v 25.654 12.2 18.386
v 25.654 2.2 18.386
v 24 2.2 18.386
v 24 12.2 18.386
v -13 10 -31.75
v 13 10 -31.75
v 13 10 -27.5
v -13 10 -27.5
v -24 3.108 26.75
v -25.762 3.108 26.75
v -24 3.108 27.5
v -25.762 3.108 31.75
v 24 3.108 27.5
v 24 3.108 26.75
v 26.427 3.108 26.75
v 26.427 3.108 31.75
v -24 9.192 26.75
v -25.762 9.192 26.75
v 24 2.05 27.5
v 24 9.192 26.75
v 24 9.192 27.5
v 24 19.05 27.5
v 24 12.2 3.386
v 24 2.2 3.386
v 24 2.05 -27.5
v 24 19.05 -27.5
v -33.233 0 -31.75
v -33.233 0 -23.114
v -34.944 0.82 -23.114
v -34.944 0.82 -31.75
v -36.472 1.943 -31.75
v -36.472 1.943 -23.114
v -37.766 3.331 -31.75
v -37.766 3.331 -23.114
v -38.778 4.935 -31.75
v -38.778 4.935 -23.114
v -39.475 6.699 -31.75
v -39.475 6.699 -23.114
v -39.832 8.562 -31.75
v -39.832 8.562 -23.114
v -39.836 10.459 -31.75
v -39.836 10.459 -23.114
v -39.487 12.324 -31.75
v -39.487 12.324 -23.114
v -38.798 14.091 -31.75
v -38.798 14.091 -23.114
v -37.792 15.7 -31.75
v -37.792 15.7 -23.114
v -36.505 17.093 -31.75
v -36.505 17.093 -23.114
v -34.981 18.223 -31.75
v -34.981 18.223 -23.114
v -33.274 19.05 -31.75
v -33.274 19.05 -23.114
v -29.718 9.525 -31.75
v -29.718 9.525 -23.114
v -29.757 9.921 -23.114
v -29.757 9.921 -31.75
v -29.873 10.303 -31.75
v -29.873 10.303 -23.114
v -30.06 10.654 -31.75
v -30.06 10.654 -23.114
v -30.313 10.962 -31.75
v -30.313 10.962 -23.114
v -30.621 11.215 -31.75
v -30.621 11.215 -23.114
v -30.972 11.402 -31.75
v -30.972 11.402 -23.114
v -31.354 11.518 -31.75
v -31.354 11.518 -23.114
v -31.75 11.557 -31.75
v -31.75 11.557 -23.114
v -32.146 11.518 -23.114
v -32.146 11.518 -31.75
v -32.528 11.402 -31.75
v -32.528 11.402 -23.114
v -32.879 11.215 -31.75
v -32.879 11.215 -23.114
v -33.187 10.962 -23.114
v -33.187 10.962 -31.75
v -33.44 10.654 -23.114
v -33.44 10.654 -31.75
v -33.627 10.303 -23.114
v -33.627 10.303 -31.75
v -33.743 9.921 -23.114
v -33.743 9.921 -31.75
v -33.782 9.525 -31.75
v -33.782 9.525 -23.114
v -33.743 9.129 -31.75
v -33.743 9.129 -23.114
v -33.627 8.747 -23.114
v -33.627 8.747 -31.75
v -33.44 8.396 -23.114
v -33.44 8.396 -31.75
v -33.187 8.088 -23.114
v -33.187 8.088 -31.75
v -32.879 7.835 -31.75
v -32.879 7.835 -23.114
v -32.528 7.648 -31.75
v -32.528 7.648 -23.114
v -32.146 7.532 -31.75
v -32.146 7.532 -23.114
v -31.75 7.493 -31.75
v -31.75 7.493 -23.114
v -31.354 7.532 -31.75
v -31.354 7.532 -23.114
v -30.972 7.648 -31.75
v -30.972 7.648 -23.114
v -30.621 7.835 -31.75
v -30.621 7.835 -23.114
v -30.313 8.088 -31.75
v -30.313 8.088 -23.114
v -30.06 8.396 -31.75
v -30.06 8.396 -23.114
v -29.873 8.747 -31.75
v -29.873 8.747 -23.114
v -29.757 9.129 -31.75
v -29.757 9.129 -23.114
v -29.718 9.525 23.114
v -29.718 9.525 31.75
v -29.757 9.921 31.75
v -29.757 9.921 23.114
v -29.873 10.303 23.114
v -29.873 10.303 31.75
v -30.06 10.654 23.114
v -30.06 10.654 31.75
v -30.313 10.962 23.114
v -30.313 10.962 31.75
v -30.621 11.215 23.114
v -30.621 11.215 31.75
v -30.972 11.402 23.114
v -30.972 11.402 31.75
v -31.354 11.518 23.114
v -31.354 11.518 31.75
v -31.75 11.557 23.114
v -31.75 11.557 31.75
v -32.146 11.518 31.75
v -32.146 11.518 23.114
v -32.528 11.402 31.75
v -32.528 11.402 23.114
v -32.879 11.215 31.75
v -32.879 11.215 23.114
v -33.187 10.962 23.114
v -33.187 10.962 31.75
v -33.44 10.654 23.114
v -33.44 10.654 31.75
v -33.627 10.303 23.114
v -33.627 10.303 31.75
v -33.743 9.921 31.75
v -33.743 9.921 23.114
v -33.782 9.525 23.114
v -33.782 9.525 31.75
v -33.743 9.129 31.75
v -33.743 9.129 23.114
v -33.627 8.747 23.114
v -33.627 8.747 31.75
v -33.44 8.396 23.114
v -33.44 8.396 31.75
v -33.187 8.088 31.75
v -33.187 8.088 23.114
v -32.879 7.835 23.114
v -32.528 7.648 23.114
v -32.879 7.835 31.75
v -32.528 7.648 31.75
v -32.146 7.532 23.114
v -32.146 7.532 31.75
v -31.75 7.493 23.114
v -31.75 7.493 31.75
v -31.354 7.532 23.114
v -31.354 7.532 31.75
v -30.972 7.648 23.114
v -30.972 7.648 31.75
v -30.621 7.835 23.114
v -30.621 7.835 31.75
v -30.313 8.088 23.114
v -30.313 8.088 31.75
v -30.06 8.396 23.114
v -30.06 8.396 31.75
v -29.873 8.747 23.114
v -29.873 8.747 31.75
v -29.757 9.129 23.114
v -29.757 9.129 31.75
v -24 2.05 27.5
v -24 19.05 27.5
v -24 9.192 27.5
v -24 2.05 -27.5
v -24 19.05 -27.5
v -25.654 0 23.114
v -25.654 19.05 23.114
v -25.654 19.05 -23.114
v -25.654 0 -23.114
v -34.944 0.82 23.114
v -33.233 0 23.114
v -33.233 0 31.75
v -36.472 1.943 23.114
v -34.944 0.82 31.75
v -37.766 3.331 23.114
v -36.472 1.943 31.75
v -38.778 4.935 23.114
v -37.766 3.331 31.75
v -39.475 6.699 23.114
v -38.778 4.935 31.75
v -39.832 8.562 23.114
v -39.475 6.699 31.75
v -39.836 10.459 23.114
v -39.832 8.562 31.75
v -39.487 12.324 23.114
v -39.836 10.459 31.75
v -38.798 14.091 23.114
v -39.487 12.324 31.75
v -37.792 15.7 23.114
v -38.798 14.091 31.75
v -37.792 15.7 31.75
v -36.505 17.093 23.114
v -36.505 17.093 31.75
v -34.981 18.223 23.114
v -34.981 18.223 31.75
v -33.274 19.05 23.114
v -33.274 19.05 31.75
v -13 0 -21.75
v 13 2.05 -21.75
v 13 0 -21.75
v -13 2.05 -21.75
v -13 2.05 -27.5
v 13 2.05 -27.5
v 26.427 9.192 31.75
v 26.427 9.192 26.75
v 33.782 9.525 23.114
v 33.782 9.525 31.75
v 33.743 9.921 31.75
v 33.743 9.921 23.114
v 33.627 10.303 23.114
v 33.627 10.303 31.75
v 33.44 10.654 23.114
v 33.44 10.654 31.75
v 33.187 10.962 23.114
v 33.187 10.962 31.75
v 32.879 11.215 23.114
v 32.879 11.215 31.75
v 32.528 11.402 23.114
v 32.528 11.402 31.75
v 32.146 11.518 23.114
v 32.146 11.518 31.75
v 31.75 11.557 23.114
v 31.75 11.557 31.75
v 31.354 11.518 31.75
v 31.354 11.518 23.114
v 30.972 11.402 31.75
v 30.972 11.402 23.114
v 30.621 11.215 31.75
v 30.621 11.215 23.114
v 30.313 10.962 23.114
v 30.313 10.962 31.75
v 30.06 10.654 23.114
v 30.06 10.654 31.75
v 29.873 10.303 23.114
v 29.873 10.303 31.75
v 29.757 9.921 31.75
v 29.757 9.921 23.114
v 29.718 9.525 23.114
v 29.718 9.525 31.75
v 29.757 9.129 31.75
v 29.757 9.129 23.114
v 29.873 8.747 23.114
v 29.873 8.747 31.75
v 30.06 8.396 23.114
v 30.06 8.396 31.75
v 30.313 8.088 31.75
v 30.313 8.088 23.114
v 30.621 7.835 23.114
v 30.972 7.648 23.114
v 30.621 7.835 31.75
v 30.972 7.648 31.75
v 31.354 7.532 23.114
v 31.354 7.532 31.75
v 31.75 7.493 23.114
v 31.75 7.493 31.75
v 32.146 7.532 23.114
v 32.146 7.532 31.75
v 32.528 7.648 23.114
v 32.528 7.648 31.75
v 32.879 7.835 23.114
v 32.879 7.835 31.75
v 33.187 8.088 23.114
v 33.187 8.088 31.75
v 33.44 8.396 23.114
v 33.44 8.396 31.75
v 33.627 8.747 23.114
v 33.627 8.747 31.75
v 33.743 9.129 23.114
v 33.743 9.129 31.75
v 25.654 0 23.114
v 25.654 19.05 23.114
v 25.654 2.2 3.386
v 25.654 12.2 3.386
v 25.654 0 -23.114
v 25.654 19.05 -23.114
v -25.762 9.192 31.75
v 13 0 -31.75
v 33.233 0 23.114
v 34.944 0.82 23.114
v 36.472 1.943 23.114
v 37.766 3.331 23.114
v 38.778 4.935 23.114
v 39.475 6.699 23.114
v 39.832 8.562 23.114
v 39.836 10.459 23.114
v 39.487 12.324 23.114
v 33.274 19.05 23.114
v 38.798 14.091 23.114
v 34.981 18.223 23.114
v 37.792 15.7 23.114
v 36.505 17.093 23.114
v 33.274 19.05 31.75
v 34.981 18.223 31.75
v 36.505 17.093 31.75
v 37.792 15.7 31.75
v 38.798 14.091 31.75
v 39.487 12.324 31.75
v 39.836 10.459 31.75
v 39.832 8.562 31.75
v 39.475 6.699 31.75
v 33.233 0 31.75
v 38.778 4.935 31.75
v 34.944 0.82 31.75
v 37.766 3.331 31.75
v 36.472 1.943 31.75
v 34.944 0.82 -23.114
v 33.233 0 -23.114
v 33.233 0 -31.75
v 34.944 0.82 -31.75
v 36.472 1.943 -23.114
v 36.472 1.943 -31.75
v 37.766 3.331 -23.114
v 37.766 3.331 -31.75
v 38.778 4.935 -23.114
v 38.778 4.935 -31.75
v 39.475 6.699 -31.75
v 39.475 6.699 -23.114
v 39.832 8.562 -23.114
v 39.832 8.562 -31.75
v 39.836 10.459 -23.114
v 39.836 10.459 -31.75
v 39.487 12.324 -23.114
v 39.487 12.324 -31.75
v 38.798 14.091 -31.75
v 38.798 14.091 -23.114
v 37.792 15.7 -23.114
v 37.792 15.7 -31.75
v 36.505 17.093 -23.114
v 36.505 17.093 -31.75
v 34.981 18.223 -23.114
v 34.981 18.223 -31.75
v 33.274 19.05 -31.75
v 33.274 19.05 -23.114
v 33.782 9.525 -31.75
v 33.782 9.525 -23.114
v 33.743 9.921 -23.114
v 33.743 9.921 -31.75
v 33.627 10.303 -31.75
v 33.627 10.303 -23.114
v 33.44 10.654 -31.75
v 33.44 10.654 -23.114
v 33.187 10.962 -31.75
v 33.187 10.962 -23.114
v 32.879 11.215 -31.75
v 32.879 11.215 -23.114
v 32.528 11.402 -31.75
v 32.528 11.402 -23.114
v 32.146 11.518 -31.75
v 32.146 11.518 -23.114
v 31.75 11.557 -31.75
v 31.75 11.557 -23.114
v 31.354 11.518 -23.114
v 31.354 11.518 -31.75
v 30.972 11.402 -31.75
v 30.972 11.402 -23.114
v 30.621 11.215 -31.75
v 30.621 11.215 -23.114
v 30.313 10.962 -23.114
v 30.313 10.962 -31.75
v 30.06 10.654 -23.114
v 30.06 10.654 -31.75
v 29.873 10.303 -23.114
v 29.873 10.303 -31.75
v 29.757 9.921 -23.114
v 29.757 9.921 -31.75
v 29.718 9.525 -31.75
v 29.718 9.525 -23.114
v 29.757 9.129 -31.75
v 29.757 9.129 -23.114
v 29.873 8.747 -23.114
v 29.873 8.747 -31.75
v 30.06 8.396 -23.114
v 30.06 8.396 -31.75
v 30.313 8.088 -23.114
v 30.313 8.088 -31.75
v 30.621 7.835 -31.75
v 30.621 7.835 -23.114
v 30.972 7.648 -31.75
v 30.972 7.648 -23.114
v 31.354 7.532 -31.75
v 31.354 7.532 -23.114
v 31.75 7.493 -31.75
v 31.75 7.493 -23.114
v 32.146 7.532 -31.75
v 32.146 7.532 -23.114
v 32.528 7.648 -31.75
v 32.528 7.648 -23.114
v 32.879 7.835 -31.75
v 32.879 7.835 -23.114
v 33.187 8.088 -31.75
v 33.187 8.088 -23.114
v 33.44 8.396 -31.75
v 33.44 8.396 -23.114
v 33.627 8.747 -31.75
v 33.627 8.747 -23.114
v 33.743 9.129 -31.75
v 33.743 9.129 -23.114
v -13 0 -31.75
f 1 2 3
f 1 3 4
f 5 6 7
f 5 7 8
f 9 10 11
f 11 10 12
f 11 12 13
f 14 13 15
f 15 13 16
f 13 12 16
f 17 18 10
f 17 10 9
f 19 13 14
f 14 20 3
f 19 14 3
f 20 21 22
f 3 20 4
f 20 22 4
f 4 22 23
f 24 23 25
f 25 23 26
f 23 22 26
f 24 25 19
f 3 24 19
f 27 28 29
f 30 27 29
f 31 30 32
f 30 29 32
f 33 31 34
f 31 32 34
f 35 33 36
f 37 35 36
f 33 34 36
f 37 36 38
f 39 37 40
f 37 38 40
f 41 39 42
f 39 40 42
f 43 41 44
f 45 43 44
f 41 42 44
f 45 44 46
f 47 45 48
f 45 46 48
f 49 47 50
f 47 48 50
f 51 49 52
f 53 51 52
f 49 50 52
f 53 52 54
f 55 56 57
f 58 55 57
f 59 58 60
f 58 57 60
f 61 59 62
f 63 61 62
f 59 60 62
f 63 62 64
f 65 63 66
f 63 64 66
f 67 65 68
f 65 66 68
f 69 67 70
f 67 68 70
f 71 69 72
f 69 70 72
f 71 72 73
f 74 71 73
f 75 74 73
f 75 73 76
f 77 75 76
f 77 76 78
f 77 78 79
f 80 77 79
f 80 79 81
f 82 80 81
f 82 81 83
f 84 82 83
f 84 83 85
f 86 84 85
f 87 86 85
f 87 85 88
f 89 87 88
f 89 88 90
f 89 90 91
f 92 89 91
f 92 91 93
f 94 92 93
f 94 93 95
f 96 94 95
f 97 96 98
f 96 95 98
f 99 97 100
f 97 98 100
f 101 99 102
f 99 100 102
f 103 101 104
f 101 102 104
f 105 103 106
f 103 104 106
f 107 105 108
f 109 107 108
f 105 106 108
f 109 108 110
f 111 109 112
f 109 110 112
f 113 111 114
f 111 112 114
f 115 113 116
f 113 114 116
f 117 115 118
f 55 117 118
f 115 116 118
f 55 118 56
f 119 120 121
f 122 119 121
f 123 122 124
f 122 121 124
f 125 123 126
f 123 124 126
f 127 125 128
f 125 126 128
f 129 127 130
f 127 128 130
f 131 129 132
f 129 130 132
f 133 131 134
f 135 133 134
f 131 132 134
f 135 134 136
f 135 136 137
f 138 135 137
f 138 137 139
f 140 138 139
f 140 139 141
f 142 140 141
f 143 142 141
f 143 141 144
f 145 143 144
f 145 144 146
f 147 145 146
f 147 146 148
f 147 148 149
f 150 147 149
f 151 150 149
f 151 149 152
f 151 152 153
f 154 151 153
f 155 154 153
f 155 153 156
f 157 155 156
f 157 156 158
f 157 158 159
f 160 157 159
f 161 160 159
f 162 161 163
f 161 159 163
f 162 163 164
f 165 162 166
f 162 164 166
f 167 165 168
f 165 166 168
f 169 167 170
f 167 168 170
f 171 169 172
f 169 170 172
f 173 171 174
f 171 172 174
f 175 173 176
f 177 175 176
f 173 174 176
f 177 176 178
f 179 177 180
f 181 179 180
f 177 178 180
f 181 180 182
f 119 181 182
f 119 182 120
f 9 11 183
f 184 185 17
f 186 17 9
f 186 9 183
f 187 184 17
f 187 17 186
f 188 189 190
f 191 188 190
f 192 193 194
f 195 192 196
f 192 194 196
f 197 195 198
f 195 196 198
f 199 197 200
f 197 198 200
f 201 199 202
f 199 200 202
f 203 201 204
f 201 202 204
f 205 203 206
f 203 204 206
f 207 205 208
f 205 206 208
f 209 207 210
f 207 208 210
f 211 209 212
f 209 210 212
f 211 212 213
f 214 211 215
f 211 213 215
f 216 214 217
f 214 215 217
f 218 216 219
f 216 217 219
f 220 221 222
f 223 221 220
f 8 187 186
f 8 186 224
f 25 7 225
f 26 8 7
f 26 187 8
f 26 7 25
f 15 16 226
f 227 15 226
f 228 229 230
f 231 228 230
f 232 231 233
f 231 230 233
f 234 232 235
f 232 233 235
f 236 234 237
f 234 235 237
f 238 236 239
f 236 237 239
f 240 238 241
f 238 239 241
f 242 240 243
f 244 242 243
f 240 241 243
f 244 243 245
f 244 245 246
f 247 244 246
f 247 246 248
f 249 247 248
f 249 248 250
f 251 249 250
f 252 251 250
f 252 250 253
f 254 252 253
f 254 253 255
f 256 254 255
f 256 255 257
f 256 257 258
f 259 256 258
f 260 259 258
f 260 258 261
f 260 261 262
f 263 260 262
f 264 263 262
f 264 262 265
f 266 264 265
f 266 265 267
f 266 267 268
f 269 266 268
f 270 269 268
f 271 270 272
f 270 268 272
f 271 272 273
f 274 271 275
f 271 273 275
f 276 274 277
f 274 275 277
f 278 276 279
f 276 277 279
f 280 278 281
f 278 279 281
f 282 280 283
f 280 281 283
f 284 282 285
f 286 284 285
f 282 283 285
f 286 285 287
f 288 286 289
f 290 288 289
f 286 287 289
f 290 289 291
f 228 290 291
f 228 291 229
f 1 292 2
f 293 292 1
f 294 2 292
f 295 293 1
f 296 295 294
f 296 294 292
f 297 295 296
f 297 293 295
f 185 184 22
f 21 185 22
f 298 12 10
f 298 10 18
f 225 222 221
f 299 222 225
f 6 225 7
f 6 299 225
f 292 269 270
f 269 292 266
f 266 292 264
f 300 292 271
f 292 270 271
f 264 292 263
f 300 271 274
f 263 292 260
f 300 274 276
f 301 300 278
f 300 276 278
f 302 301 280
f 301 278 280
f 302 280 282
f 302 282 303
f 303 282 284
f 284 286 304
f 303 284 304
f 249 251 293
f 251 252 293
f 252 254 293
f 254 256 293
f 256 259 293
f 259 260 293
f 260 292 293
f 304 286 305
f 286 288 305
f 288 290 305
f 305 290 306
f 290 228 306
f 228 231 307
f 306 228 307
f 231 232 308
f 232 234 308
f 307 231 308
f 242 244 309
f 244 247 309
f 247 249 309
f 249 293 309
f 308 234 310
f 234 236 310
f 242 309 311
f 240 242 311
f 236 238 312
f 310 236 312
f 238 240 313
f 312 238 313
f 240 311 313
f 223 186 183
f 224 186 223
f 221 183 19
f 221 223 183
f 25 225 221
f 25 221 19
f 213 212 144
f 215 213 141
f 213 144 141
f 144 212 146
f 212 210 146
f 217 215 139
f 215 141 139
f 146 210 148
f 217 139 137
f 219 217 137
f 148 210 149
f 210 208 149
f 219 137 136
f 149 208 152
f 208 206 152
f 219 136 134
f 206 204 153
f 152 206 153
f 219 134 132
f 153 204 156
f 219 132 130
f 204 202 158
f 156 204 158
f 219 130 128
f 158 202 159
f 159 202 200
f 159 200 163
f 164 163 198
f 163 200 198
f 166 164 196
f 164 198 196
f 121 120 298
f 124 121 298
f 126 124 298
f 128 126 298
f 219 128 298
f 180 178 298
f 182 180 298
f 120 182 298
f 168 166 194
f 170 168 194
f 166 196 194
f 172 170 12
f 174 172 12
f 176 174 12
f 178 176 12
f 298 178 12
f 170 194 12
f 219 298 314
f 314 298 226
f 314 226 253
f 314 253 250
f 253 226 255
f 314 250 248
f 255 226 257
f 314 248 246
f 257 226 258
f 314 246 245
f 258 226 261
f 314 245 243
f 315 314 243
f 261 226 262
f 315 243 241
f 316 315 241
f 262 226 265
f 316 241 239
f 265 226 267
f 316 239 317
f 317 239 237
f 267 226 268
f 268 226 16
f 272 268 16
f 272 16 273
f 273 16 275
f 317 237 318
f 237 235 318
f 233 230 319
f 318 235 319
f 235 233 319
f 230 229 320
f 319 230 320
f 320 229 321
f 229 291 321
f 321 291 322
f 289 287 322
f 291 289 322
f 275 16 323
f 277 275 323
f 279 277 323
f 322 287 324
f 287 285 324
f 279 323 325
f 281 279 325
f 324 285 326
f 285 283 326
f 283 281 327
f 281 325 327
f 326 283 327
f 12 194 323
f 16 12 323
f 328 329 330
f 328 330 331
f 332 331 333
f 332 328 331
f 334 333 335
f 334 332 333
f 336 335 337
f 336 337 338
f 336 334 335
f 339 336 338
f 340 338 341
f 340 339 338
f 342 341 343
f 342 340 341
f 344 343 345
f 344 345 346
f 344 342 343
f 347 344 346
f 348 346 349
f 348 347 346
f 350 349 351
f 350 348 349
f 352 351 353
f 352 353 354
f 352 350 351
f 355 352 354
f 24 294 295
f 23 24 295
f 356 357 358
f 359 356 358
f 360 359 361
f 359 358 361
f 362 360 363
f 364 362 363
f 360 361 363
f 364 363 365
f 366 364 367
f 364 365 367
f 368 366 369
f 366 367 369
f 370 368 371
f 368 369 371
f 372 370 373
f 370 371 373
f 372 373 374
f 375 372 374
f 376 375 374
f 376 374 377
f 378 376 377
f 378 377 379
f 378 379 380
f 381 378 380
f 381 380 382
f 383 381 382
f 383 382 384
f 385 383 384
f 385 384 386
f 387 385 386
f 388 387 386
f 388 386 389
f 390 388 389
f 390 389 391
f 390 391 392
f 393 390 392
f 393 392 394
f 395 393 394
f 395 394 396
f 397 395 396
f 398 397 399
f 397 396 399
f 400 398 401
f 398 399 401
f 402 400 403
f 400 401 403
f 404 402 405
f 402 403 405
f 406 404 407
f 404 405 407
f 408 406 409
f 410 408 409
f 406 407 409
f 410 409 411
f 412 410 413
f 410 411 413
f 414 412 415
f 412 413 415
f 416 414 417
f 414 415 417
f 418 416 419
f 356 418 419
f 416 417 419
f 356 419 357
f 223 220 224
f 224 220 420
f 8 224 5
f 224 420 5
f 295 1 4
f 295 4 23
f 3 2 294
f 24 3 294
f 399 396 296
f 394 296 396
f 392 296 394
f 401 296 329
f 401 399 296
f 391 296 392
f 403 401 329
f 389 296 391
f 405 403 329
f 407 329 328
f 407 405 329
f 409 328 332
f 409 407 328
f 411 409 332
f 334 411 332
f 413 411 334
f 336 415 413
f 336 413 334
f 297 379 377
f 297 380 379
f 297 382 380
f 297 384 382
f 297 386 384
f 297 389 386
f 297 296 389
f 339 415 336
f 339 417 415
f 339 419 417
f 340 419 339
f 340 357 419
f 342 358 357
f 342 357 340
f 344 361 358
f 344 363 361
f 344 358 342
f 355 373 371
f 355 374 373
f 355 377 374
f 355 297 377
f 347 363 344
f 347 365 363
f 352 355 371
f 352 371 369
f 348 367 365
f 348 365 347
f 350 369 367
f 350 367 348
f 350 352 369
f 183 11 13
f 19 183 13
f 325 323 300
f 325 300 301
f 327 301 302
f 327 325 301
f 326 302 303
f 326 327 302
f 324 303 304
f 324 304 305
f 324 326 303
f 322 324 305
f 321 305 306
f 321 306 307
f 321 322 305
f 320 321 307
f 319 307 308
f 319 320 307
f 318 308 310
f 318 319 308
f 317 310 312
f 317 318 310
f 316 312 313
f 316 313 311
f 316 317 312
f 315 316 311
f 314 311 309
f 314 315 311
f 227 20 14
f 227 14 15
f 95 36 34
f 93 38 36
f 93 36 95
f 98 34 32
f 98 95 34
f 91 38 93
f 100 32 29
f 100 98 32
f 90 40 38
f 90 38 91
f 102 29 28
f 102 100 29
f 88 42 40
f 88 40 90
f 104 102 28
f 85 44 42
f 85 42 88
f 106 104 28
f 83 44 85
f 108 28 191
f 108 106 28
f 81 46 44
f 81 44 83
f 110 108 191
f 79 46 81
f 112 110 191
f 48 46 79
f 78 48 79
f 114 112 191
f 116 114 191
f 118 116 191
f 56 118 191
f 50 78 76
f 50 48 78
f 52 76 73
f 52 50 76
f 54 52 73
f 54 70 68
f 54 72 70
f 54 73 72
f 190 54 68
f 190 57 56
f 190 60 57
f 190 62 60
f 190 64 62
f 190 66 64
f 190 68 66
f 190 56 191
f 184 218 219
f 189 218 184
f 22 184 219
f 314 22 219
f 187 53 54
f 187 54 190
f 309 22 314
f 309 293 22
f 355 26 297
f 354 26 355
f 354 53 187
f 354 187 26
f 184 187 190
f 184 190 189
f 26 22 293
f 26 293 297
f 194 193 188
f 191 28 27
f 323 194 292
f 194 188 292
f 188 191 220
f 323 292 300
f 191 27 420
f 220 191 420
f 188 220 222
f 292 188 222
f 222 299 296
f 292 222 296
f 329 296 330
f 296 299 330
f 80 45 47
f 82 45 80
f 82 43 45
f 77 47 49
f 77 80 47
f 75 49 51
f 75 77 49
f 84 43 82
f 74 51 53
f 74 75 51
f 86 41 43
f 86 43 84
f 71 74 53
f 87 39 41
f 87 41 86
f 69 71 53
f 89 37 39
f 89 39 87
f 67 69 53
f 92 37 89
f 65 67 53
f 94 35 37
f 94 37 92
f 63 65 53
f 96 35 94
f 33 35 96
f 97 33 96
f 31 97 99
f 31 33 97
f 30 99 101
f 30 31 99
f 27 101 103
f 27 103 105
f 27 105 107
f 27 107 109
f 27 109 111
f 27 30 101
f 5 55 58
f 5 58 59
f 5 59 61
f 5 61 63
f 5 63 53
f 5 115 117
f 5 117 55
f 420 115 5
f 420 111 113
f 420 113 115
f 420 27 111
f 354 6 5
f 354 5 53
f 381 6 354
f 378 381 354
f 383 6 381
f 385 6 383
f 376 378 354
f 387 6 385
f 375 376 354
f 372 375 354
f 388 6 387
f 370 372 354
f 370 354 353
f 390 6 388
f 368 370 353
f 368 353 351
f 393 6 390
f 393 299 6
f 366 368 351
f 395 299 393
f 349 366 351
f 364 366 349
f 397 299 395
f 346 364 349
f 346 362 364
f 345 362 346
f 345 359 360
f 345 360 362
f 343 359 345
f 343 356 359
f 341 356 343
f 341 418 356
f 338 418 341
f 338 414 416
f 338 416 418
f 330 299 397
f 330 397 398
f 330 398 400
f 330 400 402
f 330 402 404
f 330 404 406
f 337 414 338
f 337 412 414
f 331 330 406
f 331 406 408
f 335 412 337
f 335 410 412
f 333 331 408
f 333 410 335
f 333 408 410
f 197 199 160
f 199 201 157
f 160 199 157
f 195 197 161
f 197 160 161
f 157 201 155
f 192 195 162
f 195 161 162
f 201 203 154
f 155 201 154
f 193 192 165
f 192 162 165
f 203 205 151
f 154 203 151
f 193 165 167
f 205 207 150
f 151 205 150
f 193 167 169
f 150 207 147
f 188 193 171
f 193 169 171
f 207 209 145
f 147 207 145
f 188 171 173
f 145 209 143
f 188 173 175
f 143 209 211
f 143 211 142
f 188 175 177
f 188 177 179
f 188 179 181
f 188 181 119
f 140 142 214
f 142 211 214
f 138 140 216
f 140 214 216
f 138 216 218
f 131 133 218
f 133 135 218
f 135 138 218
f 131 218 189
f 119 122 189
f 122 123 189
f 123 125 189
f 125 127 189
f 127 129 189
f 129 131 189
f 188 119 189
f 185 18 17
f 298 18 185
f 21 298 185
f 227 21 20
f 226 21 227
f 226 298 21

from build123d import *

# Parameters (mm, degrees)
SKETCH1_W           = 86.36
SKETCH1_H           = 63.5
BOSS_EXTRUDE1_DEPTH = 19.05
CUT_EXTRUDE1_DEPTH  = 63.5
SKETCH3_W           = 14.224
SKETCH3_H           = 46.228
CUT_EXTRUDE4_DEPTH  = 63.5
SKETCH4_R           = 2.032
CUT_EXTRUDE5_DEPTH  = 63.5
SKETCH6_W           = 48
SKETCH6_H           = 55
CUT_EXTRUDE6_DEPTH  = 17
SKETCH7_W           = 15
SKETCH7_H           = 10
CUT_EXTRUDE10_DEPTH = 17
SKETCH9_W           = 26
SKETCH9_H           = 20
CUT_EXTRUDE11_DEPTH = 10
SKETCH10_W          = 52.188826159
SKETCH10_H          = 6.083943305
CUT_EXTRUDE12_DEPTH = 5


with BuildPart() as part:
    # Sketch1 → Boss-Extrude1 (new body)
    with BuildSketch(Plane(origin=(0, 0, 0), x_dir=(1, 0, 0), z_dir=(0, 1, 0))):
        Rectangle(SKETCH1_W, SKETCH1_H)
    extrude(amount=BOSS_EXTRUDE1_DEPTH)

    # Sketch2 → Cut-Extrude1 (cut)
    with BuildSketch(Plane.XY.offset(31.75)):
        with BuildLine():
            Line((-43.18, 19.05), (-43.18, 0))
            Line((-43.18, 0), (-33.232925003, 0))
            ThreePointArc((-33.232925003, 0), (-39.877976383, 9.510716436), (-33.274, 19.05))
            Line((-33.274, 19.05), (-43.18, 19.05))
        make_face()
        with BuildLine():
            Line((43.18, 19.05), (43.18, 0))
            Line((43.18, 0), (33.232925003, 0))
            ThreePointArc((33.232925003, 0), (39.877976383, 9.510716436), (33.274, 19.05))
            Line((33.274, 19.05), (43.18, 19.05))
        make_face()
    extrude(amount=-CUT_EXTRUDE1_DEPTH, mode=Mode.SUBTRACT)

    # Sketch3 → Cut-Extrude4 (cut)
    with BuildSketch(Plane(origin=(0, 19.05, 0), x_dir=(1, 0, 0), z_dir=(0, 1, 0))):
        with Locations((-32.766, 0)):
            Rectangle(SKETCH3_W, SKETCH3_H)
        with Locations((32.766, 0)):
            Rectangle(SKETCH3_W, SKETCH3_H)
    extrude(amount=-CUT_EXTRUDE4_DEPTH, mode=Mode.SUBTRACT)

    # Sketch4 → Cut-Extrude5 (cut)
    with BuildSketch(Plane.XY.offset(31.75)):
        with Locations((-31.75, 9.525)):
            Circle(SKETCH4_R)
        with Locations((31.75, 9.525)):
            Circle(SKETCH4_R)
    extrude(amount=-CUT_EXTRUDE5_DEPTH, mode=Mode.SUBTRACT)

    # Sketch6 → Cut-Extrude6 (cut)
    with BuildSketch(Plane(origin=(0, 19.05, 0), x_dir=(1, 0, 0), z_dir=(0, 1, 0))):
        Rectangle(SKETCH6_W, SKETCH6_H)
    extrude(amount=-CUT_EXTRUDE6_DEPTH, mode=Mode.SUBTRACT)

    # Sketch7 → Cut-Extrude10 (cut)
    with BuildSketch(Plane(origin=(25.654, 0, 0), x_dir=(0, 0, -1), z_dir=(1, 0, 0))):
        with Locations((-10.886, 7.2)):
            Rectangle(SKETCH7_W, SKETCH7_H)
    extrude(amount=-CUT_EXTRUDE10_DEPTH, mode=Mode.SUBTRACT)

    # Sketch9 → Cut-Extrude11 (cut)
    with BuildSketch(Plane(origin=(0, 0, -31.75), x_dir=(-1, 0, 0), z_dir=(0, 0, -1))):
        Rectangle(SKETCH9_W, SKETCH9_H)
    extrude(amount=-CUT_EXTRUDE11_DEPTH, mode=Mode.SUBTRACT)

    # Sketch10 → Cut-Extrude12 (cut)
    with BuildSketch(Plane.XY.offset(31.75)):
        with Locations((0.33271565, 6.150312699)):
            Rectangle(SKETCH10_W, SKETCH10_H)
    extrude(amount=-CUT_EXTRUDE12_DEPTH, mode=Mode.SUBTRACT)


solid = part.part
